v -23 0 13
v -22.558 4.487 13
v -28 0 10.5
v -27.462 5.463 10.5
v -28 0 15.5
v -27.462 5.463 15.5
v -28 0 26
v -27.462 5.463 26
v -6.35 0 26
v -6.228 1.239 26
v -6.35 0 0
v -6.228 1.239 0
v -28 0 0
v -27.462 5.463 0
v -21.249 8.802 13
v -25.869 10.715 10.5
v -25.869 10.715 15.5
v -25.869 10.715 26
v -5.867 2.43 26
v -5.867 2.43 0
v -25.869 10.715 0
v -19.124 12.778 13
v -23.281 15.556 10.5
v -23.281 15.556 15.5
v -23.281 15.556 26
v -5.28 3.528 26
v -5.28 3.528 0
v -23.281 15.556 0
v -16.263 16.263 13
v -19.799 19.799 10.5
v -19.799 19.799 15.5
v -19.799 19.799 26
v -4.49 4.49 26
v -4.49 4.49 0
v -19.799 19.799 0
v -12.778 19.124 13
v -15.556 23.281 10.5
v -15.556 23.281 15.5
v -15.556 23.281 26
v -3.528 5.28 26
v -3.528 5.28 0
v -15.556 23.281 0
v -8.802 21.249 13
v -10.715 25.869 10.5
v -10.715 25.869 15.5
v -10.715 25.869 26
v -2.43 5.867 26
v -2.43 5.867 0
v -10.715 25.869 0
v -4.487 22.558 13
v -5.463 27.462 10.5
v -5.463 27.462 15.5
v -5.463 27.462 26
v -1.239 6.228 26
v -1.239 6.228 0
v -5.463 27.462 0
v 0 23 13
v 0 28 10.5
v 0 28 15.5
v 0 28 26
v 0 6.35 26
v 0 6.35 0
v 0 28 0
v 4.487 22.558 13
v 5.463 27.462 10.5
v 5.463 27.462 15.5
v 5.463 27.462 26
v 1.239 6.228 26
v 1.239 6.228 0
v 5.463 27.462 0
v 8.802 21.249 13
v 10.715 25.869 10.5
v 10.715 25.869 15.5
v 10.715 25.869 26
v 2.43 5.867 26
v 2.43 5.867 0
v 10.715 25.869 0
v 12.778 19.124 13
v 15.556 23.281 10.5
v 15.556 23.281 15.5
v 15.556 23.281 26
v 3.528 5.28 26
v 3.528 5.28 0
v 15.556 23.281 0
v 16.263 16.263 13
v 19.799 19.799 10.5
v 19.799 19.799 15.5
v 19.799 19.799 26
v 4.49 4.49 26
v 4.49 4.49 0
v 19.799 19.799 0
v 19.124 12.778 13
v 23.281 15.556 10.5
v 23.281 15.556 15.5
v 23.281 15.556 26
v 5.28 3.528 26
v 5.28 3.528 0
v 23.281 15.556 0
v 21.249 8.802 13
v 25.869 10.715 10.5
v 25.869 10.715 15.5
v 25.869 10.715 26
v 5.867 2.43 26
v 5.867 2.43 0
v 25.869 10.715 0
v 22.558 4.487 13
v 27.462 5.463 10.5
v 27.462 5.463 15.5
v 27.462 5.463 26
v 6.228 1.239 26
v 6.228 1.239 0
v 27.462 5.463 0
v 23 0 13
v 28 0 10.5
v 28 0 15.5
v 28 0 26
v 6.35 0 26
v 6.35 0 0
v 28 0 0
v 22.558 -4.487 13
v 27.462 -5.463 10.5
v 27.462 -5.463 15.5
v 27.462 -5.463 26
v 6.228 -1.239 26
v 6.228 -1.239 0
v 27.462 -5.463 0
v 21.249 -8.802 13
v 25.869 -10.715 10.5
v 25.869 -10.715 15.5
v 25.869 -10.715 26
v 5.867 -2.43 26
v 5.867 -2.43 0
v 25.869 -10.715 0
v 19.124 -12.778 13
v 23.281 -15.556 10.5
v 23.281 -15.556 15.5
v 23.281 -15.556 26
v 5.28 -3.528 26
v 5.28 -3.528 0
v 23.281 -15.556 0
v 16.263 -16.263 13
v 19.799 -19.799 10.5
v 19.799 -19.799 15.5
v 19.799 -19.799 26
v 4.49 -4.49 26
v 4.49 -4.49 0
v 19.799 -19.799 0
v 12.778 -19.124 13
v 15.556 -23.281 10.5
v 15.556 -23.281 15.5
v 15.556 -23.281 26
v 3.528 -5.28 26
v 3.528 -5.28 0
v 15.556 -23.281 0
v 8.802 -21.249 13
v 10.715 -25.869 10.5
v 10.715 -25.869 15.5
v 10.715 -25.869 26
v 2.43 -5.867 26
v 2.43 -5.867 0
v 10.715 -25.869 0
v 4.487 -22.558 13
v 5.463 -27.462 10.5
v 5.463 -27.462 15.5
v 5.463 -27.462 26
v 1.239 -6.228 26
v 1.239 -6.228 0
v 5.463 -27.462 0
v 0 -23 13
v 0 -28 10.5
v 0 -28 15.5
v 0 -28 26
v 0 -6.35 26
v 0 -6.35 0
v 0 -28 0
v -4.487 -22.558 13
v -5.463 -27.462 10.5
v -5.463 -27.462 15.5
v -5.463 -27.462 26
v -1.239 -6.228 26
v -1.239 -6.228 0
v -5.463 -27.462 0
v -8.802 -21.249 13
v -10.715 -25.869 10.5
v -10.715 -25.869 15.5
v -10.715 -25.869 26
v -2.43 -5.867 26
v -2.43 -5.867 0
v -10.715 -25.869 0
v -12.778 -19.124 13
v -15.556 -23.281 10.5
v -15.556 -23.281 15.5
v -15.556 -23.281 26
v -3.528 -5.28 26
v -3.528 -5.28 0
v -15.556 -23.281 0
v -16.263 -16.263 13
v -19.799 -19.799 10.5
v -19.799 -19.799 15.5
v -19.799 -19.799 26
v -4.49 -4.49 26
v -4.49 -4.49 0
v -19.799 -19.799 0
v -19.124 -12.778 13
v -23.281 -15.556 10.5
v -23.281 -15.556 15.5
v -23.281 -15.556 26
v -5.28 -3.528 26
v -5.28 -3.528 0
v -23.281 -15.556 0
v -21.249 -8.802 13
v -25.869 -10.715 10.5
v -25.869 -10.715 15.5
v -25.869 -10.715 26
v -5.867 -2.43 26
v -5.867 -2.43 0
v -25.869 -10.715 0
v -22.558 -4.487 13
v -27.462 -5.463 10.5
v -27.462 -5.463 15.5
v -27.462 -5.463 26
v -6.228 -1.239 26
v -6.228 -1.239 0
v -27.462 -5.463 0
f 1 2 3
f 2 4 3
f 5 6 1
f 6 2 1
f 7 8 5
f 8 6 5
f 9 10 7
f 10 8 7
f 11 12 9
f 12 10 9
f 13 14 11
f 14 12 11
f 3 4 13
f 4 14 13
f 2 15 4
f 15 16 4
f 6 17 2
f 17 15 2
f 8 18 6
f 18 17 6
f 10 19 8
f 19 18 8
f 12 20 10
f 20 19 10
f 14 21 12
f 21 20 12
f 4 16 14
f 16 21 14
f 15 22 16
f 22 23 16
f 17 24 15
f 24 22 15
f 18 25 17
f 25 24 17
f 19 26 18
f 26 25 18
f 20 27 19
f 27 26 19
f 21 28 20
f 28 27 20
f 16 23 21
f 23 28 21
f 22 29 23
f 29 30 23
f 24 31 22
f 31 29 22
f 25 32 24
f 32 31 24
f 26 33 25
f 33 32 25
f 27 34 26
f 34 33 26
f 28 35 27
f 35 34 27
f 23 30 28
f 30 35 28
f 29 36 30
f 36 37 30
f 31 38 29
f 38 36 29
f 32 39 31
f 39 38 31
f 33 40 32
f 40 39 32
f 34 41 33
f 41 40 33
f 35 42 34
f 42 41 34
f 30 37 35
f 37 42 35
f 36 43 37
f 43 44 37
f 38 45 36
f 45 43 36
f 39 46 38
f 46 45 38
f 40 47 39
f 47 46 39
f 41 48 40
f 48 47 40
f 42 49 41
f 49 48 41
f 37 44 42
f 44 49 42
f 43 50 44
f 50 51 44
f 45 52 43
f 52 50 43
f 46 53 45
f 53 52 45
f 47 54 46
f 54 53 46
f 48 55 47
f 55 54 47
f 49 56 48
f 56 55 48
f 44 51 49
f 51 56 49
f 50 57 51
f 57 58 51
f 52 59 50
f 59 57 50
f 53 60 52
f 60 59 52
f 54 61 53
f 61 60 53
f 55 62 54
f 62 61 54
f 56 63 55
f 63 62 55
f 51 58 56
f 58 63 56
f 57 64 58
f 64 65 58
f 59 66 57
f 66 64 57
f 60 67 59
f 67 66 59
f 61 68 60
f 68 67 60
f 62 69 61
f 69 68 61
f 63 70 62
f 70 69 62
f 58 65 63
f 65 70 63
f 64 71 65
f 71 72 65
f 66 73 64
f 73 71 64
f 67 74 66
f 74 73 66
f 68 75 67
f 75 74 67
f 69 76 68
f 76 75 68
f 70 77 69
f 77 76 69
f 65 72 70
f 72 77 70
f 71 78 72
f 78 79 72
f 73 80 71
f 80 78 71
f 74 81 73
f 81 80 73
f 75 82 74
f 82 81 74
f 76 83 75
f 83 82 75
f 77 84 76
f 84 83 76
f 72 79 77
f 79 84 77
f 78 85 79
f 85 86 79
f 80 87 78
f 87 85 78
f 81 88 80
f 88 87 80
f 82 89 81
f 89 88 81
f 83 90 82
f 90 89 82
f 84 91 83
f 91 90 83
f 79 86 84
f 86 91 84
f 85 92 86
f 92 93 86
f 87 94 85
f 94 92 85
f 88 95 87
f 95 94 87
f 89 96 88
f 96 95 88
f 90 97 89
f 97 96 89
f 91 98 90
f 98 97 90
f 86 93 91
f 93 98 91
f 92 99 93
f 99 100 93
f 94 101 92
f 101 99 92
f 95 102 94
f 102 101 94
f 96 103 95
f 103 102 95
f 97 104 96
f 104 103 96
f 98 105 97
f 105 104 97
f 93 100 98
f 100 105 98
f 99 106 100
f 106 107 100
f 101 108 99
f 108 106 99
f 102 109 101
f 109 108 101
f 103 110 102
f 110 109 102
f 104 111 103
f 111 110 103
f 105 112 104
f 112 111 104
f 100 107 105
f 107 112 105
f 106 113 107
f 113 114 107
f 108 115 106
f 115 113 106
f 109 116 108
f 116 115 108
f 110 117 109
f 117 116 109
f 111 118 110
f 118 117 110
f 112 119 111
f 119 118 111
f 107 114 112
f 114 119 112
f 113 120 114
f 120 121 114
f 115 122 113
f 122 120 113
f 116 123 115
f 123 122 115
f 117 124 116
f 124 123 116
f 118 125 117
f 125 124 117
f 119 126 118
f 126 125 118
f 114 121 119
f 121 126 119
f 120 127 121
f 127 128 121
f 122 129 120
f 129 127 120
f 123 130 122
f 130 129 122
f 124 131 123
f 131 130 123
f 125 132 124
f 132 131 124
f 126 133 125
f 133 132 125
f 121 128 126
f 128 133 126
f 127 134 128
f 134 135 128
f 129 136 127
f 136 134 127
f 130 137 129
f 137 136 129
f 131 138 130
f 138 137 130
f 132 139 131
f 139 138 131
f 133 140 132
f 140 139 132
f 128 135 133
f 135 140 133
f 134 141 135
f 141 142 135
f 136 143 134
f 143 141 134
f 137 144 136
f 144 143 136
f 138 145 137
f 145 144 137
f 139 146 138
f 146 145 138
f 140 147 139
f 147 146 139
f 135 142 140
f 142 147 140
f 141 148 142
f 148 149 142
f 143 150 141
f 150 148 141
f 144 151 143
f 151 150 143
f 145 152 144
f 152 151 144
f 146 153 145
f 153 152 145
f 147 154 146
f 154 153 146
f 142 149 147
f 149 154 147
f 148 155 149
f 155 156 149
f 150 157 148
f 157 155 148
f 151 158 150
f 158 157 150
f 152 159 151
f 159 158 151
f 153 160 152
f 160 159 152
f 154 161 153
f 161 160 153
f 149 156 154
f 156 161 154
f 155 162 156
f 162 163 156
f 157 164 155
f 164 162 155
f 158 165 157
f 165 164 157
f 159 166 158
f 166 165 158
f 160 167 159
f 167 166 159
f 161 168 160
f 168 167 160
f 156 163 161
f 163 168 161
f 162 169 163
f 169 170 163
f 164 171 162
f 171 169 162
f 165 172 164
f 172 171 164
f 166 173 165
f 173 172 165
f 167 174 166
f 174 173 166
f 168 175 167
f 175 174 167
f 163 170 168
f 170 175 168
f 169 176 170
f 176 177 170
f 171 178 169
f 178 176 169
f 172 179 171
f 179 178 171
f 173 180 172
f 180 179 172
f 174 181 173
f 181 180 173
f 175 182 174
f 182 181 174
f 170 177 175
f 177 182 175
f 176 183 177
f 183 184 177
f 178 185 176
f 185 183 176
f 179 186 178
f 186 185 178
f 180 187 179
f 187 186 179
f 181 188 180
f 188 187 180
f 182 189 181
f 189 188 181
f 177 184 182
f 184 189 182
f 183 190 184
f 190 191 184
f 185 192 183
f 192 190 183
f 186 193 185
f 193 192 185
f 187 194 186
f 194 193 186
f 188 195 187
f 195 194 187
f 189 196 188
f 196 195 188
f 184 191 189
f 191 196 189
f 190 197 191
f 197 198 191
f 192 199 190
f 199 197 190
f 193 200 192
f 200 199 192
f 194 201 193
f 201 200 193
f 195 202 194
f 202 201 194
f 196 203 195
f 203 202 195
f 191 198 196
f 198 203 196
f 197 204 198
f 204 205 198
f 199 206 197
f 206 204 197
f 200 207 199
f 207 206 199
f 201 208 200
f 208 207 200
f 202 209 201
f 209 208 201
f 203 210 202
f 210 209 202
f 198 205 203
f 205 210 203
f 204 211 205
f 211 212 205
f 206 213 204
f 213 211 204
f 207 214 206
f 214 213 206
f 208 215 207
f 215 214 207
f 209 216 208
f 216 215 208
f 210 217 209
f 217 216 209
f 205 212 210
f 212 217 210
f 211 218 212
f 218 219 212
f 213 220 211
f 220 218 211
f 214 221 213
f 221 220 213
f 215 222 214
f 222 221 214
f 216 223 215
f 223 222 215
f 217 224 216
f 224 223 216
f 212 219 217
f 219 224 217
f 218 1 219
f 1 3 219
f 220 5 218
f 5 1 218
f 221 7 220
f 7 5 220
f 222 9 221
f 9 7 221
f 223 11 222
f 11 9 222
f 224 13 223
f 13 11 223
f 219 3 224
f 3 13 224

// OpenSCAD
$fn = 32;

// ----------------------------------------------------------------------
// Belt roller: 56 mm barrel, 26 mm wide, bore 12.7 mm
// ----------------------------------------------------------------------

// --- parameters (mm) ---
bore_d = 12.7;            // bore
barrel_d = 56;            // barrel diameter
roller_w = 26;            // roller width
groove_w = 5;             // guide groove width
groove_d = 5;             // guide groove depth

roller_profile = [[6.35, 0], [28, 0], [28, 10.5], [23, 13], [28, 15.5], [28, 26], [6.35, 26]];

/* the profile stays clear of the axis, so the bore comes out of the revolve */
rotate_extrude() polygon(roller_profile);
